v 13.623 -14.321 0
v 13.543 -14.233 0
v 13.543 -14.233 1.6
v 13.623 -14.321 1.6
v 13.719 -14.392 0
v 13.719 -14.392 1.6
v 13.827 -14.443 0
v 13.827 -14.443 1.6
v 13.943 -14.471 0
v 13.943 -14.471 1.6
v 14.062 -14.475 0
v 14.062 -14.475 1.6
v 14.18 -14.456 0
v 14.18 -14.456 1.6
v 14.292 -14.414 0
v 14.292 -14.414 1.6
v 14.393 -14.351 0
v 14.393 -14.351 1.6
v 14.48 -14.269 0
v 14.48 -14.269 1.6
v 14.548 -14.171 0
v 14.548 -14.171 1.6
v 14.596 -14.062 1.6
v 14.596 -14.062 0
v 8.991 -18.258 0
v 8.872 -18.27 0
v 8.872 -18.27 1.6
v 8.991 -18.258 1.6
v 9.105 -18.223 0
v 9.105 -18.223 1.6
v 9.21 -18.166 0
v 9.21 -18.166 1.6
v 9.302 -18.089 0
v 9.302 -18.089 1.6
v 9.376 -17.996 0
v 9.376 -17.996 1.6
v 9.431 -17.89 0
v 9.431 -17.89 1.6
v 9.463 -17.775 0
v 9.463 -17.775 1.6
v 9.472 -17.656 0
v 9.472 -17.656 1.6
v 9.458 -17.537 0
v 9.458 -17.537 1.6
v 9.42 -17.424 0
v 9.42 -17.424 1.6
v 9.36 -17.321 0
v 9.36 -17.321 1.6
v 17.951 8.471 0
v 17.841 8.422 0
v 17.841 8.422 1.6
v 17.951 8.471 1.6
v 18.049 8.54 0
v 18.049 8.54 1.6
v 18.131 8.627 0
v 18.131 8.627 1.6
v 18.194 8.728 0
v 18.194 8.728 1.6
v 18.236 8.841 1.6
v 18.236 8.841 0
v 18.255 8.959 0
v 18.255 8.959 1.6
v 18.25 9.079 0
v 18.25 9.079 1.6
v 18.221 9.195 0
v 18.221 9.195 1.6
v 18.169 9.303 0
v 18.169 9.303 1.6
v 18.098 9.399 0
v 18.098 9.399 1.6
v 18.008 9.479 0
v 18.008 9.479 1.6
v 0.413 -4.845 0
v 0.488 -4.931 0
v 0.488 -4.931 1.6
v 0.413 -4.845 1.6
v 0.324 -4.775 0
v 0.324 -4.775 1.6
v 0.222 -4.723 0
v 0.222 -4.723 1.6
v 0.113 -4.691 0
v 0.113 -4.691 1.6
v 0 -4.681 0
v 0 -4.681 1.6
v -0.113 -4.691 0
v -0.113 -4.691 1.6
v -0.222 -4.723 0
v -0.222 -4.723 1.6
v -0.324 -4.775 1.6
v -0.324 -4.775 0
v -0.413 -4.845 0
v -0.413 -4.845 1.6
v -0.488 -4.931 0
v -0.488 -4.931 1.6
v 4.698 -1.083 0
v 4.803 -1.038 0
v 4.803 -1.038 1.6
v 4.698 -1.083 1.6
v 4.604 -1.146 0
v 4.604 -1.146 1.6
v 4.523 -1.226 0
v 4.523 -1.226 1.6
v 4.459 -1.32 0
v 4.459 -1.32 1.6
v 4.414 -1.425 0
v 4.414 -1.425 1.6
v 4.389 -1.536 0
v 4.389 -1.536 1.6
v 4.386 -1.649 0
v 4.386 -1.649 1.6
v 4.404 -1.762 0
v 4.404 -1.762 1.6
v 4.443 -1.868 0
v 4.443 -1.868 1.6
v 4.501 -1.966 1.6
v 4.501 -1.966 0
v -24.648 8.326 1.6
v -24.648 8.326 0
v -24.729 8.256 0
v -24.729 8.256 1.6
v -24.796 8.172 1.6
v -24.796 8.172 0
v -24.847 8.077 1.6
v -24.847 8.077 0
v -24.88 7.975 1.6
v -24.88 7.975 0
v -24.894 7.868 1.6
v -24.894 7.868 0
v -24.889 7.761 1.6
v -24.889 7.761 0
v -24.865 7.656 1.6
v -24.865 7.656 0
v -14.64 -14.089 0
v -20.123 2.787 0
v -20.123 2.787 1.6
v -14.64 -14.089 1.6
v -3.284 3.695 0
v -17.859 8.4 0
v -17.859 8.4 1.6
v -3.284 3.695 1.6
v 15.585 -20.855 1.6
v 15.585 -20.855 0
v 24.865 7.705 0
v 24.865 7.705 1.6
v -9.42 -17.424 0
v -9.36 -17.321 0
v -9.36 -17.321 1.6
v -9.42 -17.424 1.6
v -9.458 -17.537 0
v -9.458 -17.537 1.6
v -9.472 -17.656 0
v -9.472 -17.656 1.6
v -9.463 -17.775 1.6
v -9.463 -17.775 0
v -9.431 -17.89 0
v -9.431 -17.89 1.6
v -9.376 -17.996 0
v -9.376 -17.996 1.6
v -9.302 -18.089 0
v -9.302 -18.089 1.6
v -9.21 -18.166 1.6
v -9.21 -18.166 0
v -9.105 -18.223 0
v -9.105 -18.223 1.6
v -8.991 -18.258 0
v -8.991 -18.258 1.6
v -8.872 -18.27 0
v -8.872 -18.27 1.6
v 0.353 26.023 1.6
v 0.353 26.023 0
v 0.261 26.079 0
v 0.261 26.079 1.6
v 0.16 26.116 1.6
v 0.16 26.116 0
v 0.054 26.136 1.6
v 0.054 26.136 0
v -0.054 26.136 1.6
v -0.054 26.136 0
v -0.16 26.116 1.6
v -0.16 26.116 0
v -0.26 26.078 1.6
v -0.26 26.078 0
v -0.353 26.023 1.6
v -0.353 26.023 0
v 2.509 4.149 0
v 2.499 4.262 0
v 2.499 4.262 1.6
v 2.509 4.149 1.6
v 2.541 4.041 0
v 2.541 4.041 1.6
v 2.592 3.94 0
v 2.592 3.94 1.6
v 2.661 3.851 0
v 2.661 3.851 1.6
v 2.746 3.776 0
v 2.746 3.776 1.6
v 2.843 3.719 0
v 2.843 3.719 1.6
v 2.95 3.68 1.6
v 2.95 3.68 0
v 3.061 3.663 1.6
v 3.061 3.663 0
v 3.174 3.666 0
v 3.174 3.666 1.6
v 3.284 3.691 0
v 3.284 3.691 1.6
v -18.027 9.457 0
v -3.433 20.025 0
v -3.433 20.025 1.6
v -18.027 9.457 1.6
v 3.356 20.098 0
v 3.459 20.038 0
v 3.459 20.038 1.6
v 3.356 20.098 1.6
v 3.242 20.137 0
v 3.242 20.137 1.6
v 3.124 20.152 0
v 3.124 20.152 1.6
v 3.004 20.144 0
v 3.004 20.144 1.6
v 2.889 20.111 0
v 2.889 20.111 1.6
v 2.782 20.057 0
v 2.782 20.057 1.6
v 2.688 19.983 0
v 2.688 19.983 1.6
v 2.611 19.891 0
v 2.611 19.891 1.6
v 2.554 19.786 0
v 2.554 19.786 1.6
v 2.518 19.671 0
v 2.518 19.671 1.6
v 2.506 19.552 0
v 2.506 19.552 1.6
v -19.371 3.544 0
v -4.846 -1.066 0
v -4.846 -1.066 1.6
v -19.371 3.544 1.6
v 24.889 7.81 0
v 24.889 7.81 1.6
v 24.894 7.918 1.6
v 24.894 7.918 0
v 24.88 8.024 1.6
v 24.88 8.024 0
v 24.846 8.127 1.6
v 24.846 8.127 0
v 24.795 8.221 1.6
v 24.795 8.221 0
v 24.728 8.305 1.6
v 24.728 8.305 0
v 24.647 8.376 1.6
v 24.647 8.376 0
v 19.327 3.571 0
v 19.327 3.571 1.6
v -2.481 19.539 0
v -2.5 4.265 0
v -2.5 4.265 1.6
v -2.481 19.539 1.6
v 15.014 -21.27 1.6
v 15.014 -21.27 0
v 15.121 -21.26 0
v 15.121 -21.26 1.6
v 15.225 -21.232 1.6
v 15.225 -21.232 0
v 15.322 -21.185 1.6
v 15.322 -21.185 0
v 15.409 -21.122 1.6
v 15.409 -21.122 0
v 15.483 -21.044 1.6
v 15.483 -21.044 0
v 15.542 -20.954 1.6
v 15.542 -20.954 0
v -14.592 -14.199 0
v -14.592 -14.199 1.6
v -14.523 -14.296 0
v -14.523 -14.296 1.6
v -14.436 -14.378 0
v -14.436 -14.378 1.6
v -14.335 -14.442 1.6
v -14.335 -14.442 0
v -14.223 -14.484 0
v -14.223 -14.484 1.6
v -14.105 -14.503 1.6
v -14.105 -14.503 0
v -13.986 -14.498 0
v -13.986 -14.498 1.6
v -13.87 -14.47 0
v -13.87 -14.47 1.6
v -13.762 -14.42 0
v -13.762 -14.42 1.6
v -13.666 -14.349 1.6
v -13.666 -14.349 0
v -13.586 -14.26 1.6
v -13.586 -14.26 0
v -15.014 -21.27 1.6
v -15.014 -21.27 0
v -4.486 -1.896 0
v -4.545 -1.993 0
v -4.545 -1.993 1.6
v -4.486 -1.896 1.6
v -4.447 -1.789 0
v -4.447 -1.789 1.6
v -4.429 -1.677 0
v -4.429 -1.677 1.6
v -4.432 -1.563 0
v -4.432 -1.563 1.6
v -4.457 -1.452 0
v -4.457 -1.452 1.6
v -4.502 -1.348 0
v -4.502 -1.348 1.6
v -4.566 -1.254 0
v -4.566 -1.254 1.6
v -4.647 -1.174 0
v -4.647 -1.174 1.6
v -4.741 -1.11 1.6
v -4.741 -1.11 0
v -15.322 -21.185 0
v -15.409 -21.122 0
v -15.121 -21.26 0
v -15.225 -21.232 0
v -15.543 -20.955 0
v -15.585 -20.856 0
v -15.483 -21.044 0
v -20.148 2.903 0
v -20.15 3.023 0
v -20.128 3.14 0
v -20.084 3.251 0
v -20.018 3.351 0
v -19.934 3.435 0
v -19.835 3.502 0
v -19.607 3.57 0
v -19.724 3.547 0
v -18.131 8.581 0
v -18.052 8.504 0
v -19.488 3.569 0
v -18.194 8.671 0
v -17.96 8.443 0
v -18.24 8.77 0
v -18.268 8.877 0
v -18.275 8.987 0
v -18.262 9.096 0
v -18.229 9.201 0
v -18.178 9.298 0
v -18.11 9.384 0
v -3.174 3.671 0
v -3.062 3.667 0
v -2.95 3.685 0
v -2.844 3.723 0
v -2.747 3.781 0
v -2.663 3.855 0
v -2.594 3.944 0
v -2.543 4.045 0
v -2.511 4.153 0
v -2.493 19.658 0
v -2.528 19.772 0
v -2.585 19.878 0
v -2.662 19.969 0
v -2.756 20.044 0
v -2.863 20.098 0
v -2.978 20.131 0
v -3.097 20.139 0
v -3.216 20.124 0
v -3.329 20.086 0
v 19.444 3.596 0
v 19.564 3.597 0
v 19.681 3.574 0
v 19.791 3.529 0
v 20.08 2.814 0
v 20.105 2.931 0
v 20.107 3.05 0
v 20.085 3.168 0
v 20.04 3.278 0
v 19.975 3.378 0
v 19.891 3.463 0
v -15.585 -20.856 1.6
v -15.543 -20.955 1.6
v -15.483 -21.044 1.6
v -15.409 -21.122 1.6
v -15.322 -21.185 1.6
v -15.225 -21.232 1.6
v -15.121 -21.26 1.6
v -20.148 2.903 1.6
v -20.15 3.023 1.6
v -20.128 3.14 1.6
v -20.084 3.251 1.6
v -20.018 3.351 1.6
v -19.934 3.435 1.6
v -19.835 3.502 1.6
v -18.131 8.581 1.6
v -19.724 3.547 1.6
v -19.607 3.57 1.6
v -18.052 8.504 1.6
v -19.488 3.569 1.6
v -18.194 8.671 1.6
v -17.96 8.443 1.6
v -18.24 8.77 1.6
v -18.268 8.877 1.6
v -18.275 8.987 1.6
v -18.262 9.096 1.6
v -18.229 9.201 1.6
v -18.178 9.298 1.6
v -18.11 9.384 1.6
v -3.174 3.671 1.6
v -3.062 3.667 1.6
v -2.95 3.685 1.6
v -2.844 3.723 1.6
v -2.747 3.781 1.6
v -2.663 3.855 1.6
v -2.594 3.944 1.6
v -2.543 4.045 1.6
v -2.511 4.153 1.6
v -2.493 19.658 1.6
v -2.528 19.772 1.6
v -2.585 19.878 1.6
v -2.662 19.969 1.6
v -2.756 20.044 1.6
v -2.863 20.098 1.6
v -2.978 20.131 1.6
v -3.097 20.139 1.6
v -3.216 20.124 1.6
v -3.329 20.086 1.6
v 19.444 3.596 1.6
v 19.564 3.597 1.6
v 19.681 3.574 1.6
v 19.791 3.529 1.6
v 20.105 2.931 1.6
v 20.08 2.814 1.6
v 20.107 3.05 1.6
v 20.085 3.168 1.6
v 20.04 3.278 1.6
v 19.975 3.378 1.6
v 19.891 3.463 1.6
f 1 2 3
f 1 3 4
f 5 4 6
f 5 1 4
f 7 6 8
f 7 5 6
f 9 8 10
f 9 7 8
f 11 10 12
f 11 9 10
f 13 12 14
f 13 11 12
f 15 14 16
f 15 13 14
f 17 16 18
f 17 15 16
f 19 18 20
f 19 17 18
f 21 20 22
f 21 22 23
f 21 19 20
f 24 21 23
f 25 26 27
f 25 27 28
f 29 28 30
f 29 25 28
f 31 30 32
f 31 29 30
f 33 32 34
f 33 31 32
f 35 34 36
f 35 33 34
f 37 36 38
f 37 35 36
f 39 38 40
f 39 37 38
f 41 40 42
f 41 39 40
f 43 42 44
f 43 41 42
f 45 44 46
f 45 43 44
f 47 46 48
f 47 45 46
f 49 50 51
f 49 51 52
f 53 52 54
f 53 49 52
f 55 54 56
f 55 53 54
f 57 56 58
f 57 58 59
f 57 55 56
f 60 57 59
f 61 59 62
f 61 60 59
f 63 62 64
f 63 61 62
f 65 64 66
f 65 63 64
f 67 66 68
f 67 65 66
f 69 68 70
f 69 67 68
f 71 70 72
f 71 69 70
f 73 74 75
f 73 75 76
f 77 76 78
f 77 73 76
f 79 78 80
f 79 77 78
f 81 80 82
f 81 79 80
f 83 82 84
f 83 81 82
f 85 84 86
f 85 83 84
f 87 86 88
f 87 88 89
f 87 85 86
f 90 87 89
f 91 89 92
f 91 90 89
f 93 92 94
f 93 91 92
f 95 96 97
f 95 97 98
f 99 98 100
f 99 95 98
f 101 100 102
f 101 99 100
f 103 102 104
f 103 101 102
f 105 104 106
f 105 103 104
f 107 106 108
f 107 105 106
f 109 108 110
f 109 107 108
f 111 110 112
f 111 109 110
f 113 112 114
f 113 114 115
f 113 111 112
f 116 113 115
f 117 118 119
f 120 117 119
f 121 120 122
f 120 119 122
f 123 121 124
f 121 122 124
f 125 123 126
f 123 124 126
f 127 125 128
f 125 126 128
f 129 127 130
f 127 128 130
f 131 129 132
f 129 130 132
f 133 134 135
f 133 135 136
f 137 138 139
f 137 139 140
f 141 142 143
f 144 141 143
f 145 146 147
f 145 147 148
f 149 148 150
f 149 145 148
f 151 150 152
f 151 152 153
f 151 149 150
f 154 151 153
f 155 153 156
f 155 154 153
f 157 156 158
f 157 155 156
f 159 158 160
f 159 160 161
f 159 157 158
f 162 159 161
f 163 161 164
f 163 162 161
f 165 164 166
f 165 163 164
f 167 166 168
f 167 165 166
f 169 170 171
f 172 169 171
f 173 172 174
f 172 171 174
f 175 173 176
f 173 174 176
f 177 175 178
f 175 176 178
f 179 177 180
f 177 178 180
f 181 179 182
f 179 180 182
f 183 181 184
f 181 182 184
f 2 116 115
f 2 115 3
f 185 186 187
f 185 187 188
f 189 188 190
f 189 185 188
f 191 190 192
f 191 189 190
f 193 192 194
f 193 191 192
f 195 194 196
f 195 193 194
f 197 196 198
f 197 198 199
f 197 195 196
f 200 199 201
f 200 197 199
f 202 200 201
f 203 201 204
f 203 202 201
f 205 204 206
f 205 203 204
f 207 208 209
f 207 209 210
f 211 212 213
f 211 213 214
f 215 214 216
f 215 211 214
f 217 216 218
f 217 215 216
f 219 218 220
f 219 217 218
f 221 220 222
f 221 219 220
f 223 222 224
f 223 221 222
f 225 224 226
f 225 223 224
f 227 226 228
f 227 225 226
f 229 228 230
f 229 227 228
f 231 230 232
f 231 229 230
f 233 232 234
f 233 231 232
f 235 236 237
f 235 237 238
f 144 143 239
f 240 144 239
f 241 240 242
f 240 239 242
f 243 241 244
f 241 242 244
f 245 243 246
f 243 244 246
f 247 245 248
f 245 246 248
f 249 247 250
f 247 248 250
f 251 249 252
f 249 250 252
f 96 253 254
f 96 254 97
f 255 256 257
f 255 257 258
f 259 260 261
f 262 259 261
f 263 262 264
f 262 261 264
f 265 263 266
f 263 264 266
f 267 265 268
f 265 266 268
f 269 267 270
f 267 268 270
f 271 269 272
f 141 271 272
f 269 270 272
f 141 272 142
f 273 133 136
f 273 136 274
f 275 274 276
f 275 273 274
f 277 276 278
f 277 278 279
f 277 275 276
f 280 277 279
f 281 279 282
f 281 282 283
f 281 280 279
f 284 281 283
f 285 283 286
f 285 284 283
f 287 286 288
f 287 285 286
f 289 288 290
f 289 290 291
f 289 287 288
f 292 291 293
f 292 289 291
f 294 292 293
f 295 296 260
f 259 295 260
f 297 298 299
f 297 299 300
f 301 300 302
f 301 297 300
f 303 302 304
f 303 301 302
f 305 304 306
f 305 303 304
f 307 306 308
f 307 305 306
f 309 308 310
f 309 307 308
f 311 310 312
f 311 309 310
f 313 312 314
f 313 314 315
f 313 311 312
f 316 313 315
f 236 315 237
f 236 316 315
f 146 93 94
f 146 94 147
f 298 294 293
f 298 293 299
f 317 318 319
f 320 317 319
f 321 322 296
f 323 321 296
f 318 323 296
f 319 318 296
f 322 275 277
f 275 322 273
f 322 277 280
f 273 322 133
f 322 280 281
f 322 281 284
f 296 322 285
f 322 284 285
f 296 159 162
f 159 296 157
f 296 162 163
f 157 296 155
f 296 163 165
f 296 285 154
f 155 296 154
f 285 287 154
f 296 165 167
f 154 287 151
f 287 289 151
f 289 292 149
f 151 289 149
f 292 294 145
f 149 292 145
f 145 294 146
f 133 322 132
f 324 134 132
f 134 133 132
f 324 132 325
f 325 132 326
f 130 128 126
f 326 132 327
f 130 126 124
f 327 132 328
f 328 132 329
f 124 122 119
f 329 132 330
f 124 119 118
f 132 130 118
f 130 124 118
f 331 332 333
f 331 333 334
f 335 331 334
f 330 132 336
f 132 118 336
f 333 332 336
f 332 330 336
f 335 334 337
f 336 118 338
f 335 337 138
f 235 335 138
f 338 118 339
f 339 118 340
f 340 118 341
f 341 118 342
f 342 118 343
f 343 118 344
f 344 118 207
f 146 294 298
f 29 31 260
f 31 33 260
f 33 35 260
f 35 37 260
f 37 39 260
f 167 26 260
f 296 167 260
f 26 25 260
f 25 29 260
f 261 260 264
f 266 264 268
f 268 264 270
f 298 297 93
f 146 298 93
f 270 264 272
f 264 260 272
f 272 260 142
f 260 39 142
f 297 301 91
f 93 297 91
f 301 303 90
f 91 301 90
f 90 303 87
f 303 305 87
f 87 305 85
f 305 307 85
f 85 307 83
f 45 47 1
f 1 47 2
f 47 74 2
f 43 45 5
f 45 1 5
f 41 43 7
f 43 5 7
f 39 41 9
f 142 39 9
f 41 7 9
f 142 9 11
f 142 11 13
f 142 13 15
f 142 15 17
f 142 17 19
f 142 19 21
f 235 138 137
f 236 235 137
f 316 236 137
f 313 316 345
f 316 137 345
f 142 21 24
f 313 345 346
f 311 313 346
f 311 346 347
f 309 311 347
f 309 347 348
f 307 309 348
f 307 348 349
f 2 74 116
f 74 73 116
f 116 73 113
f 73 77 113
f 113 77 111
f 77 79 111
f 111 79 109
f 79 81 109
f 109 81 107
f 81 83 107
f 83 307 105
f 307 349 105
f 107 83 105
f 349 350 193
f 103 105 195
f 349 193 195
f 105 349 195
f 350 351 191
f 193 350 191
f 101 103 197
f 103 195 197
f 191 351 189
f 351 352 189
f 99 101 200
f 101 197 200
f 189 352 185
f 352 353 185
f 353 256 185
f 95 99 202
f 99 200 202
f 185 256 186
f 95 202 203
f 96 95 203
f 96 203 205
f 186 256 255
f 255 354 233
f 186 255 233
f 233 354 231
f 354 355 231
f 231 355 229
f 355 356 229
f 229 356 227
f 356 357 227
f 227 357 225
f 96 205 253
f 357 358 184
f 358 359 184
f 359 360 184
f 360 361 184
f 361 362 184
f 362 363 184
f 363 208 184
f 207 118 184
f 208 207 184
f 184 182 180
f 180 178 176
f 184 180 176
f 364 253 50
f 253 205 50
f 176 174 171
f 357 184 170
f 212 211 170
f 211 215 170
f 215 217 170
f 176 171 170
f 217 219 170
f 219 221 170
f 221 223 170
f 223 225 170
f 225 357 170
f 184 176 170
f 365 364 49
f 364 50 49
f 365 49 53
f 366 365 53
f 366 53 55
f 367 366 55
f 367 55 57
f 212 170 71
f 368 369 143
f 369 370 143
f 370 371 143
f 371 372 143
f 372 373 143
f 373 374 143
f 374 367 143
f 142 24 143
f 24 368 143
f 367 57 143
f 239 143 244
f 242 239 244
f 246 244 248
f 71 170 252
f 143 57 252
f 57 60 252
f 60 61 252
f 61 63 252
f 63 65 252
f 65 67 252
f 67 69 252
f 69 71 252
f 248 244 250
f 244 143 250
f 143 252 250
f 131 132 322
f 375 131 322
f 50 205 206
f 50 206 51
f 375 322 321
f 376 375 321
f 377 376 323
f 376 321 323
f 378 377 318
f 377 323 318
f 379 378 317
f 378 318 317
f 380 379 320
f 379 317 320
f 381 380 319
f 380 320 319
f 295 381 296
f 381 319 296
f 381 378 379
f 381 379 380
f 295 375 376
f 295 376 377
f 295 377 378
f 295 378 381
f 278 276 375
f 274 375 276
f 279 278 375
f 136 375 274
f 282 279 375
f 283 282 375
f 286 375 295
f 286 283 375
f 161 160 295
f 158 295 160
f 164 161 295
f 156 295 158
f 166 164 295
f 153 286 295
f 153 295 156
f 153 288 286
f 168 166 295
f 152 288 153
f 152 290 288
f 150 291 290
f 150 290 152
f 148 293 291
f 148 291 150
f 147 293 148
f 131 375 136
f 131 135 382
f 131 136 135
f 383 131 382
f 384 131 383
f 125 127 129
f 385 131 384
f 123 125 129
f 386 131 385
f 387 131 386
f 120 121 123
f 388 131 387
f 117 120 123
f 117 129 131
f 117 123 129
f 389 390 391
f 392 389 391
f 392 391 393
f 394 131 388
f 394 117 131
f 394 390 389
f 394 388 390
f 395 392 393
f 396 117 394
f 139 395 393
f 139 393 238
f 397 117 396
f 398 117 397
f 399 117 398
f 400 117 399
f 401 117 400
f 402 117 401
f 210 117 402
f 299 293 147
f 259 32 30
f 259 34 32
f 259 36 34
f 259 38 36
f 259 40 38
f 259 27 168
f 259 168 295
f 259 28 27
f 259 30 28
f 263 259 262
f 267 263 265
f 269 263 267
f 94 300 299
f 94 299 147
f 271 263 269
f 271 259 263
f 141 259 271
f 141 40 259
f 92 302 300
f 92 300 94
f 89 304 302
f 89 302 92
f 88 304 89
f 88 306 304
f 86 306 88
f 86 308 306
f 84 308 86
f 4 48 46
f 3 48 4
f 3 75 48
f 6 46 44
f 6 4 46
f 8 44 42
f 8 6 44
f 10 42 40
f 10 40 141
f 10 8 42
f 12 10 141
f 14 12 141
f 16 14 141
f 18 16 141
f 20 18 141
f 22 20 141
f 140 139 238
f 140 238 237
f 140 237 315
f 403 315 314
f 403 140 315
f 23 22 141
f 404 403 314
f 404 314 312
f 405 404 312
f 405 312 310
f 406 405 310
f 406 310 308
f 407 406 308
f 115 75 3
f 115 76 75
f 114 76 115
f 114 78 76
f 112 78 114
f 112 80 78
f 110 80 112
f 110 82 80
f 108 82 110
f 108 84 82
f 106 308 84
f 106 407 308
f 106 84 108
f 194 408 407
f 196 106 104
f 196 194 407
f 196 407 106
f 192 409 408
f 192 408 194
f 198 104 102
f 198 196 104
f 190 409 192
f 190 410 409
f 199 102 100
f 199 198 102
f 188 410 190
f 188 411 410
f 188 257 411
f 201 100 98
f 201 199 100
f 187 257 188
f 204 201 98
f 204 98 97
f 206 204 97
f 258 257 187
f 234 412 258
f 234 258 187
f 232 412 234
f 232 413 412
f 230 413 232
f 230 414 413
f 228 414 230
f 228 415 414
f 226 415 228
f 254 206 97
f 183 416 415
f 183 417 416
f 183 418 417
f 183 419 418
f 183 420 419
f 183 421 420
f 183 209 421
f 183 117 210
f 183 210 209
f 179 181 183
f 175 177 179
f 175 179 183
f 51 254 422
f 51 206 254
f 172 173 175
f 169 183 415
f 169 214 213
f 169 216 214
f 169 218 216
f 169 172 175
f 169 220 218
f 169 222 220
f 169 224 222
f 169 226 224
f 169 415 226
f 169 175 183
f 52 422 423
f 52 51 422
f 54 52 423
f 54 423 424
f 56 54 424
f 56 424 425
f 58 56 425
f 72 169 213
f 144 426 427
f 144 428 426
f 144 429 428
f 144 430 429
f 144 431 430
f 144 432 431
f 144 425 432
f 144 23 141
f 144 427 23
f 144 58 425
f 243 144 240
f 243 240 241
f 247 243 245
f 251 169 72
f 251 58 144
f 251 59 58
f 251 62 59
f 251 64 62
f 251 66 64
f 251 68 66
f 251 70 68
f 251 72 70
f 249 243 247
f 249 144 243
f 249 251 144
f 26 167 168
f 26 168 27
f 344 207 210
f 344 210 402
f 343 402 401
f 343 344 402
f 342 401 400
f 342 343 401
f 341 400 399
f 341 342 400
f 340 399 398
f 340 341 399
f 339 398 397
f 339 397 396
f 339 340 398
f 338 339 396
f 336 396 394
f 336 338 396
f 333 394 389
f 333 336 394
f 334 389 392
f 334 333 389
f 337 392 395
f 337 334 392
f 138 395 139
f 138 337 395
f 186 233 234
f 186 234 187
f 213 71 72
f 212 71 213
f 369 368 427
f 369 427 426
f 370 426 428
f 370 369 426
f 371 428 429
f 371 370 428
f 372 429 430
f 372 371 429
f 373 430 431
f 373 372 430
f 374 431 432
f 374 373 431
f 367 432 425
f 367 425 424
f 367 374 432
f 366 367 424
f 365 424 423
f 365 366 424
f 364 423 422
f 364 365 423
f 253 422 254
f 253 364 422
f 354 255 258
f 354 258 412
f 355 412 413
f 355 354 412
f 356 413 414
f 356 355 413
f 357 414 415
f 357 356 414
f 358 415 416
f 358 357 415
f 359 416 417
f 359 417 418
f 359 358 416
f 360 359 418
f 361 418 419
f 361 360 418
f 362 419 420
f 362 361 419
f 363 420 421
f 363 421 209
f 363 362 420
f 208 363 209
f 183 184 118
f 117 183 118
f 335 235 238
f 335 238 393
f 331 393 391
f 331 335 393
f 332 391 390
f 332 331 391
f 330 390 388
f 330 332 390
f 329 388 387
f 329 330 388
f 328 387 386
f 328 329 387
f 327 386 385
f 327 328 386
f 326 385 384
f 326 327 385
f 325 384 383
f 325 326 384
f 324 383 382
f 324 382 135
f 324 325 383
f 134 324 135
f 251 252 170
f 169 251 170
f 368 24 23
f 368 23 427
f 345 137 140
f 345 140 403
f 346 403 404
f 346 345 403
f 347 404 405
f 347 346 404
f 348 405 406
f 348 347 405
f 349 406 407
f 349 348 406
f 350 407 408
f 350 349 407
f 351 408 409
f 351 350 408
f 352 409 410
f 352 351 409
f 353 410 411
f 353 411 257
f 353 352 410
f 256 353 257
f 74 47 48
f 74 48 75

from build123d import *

# Parameters (mm, degrees)
PCB_THICKNESS_DEPTH = 1.6


with BuildPart() as part:
    # Model → PCB Thickness (new body)
    with BuildSketch(Plane.XY):
        with BuildLine():
            ThreePointArc((-24.647921054, 8.326484664), (-24.865455476, 8.026418687), (-24.865198885, 7.655796575))
            Line((-24.865198885, 7.655796575), (-15.584897999, -20.855706146))
            ThreePointArc((-15.584897999, -20.855706146), (-15.366905589, -21.155501643), (-15.014360333, -21.27))
            Line((-15.014360333, -21.27), (15.014062777, -21.27))
            ThreePointArc((15.014062777, -21.27), (15.366729058, -21.155413735), (15.584692966, -20.855421647))
            Line((15.584692966, -20.855421647), (24.865283806, 7.705350163))
            ThreePointArc((24.865283806, 7.705350163), (24.86528072, 8.07620295), (24.647279393, 8.376214969))
            Line((24.647279393, 8.376214969), (0.353119455, 26.023485868))
            ThreePointArc((0.353119455, 26.023485868), (0.00010165, 26.138042579), (-0.352766154, 26.023024653))
            Line((-0.352766154, 26.023024653), (-24.647921054, 8.326484664))
        make_face()
        with BuildLine():
            ThreePointArc((-20.122996261, 2.786788494), (-19.978077319, 3.395006483), (-19.370866555, 3.544089386))
            Line((-19.370866555, 3.544089386), (-4.846077132, -1.065507257))
            ThreePointArc((-4.846077132, -1.065507257), (-4.456938312, -1.451989932), (-4.544592973, -1.993390467))
            Line((-4.544592973, -1.993390467), (-13.585986389, -14.259981534))
            ThreePointArc((-13.585986389, -14.259981534), (-14.164858865, -14.496276924), (-14.639600254, -14.089399218))
            Line((-14.639600254, -14.089399218), (-20.122996261, 2.786788494))
        make_face(mode=Mode.SUBTRACT)
        with BuildLine():
            ThreePointArc((-8.872358317, -18.27), (-9.406025436, -17.9442251), (-9.36017471, -17.320664685))
            Line((-9.36017471, -17.320664685), (-0.487816395, -4.931187808))
            ThreePointArc((-0.487816395, -4.931187808), (0, -4.680523127), (0.487816395, -4.931187808))
            Line((0.487816395, -4.931187808), (9.36017471, -17.320664685))
            ThreePointArc((9.36017471, -17.320664685), (9.406025435, -17.944225099), (8.872358317, -18.27))
            Line((8.872358317, -18.27), (-8.872358317, -18.27))
        make_face(mode=Mode.SUBTRACT)
        with BuildLine():
            ThreePointArc((14.596200254, -14.061999218), (14.121457712, -14.46887711), (13.542585003, -14.232579653))
            Line((13.542585003, -14.232579653), (4.50125132, -1.965969627))
            ThreePointArc((4.50125132, -1.965969627), (4.413598402, -1.424569864), (4.80273686, -1.038088302))
            Line((4.80273686, -1.038088302), (19.327466555, 3.571489386))
            ThreePointArc((19.327466555, 3.571489386), (19.934677319, 3.422406484), (20.079596261, 2.814188494))
            Line((20.079596261, 2.814188494), (14.596200254, -14.061999218))
        make_face(mode=Mode.SUBTRACT)
        with BuildLine():
            ThreePointArc((-3.432918624, 20.025486513), (-2.807853844, 20.073751171), (-2.481000035, 19.538772626))
            Line((-2.481000035, 19.538772626), (-2.500299876, 4.265097836))
            ThreePointArc((-2.500299876, 4.265097836), (-2.74743143, 3.780639668), (-3.284491549, 3.69496499))
            Line((-3.284491549, 3.69496499), (-17.859258249, 8.399918804))
            ThreePointArc((-17.859258249, 8.399918804), (-18.267531635, 8.876938588), (-18.026854434, 9.45686058))
            Line((-18.026854434, 9.45686058), (-3.432918624, 20.025486513))
        make_face(mode=Mode.SUBTRACT)
        with BuildLine():
            ThreePointArc((18.008187001, 9.478509434), (18.248398797, 8.899239554), (17.841223922, 8.422307775))
            Line((17.841223922, 8.422307775), (3.284260895, 3.69088729))
            ThreePointArc((3.284260895, 3.69088729), (2.746034776, 3.776162456), (2.498798945, 4.261789527))
            Line((2.498798945, 4.261789527), (2.506100046, 19.552295755))
            ThreePointArc((2.506100046, 19.552295755), (2.83391858, 20.086965957), (3.459163763, 20.037918253))
            Line((3.459163763, 20.037918253), (18.008187001, 9.478509434))
        make_face(mode=Mode.SUBTRACT)
    extrude(amount=PCB_THICKNESS_DEPTH)


solid = part.part
